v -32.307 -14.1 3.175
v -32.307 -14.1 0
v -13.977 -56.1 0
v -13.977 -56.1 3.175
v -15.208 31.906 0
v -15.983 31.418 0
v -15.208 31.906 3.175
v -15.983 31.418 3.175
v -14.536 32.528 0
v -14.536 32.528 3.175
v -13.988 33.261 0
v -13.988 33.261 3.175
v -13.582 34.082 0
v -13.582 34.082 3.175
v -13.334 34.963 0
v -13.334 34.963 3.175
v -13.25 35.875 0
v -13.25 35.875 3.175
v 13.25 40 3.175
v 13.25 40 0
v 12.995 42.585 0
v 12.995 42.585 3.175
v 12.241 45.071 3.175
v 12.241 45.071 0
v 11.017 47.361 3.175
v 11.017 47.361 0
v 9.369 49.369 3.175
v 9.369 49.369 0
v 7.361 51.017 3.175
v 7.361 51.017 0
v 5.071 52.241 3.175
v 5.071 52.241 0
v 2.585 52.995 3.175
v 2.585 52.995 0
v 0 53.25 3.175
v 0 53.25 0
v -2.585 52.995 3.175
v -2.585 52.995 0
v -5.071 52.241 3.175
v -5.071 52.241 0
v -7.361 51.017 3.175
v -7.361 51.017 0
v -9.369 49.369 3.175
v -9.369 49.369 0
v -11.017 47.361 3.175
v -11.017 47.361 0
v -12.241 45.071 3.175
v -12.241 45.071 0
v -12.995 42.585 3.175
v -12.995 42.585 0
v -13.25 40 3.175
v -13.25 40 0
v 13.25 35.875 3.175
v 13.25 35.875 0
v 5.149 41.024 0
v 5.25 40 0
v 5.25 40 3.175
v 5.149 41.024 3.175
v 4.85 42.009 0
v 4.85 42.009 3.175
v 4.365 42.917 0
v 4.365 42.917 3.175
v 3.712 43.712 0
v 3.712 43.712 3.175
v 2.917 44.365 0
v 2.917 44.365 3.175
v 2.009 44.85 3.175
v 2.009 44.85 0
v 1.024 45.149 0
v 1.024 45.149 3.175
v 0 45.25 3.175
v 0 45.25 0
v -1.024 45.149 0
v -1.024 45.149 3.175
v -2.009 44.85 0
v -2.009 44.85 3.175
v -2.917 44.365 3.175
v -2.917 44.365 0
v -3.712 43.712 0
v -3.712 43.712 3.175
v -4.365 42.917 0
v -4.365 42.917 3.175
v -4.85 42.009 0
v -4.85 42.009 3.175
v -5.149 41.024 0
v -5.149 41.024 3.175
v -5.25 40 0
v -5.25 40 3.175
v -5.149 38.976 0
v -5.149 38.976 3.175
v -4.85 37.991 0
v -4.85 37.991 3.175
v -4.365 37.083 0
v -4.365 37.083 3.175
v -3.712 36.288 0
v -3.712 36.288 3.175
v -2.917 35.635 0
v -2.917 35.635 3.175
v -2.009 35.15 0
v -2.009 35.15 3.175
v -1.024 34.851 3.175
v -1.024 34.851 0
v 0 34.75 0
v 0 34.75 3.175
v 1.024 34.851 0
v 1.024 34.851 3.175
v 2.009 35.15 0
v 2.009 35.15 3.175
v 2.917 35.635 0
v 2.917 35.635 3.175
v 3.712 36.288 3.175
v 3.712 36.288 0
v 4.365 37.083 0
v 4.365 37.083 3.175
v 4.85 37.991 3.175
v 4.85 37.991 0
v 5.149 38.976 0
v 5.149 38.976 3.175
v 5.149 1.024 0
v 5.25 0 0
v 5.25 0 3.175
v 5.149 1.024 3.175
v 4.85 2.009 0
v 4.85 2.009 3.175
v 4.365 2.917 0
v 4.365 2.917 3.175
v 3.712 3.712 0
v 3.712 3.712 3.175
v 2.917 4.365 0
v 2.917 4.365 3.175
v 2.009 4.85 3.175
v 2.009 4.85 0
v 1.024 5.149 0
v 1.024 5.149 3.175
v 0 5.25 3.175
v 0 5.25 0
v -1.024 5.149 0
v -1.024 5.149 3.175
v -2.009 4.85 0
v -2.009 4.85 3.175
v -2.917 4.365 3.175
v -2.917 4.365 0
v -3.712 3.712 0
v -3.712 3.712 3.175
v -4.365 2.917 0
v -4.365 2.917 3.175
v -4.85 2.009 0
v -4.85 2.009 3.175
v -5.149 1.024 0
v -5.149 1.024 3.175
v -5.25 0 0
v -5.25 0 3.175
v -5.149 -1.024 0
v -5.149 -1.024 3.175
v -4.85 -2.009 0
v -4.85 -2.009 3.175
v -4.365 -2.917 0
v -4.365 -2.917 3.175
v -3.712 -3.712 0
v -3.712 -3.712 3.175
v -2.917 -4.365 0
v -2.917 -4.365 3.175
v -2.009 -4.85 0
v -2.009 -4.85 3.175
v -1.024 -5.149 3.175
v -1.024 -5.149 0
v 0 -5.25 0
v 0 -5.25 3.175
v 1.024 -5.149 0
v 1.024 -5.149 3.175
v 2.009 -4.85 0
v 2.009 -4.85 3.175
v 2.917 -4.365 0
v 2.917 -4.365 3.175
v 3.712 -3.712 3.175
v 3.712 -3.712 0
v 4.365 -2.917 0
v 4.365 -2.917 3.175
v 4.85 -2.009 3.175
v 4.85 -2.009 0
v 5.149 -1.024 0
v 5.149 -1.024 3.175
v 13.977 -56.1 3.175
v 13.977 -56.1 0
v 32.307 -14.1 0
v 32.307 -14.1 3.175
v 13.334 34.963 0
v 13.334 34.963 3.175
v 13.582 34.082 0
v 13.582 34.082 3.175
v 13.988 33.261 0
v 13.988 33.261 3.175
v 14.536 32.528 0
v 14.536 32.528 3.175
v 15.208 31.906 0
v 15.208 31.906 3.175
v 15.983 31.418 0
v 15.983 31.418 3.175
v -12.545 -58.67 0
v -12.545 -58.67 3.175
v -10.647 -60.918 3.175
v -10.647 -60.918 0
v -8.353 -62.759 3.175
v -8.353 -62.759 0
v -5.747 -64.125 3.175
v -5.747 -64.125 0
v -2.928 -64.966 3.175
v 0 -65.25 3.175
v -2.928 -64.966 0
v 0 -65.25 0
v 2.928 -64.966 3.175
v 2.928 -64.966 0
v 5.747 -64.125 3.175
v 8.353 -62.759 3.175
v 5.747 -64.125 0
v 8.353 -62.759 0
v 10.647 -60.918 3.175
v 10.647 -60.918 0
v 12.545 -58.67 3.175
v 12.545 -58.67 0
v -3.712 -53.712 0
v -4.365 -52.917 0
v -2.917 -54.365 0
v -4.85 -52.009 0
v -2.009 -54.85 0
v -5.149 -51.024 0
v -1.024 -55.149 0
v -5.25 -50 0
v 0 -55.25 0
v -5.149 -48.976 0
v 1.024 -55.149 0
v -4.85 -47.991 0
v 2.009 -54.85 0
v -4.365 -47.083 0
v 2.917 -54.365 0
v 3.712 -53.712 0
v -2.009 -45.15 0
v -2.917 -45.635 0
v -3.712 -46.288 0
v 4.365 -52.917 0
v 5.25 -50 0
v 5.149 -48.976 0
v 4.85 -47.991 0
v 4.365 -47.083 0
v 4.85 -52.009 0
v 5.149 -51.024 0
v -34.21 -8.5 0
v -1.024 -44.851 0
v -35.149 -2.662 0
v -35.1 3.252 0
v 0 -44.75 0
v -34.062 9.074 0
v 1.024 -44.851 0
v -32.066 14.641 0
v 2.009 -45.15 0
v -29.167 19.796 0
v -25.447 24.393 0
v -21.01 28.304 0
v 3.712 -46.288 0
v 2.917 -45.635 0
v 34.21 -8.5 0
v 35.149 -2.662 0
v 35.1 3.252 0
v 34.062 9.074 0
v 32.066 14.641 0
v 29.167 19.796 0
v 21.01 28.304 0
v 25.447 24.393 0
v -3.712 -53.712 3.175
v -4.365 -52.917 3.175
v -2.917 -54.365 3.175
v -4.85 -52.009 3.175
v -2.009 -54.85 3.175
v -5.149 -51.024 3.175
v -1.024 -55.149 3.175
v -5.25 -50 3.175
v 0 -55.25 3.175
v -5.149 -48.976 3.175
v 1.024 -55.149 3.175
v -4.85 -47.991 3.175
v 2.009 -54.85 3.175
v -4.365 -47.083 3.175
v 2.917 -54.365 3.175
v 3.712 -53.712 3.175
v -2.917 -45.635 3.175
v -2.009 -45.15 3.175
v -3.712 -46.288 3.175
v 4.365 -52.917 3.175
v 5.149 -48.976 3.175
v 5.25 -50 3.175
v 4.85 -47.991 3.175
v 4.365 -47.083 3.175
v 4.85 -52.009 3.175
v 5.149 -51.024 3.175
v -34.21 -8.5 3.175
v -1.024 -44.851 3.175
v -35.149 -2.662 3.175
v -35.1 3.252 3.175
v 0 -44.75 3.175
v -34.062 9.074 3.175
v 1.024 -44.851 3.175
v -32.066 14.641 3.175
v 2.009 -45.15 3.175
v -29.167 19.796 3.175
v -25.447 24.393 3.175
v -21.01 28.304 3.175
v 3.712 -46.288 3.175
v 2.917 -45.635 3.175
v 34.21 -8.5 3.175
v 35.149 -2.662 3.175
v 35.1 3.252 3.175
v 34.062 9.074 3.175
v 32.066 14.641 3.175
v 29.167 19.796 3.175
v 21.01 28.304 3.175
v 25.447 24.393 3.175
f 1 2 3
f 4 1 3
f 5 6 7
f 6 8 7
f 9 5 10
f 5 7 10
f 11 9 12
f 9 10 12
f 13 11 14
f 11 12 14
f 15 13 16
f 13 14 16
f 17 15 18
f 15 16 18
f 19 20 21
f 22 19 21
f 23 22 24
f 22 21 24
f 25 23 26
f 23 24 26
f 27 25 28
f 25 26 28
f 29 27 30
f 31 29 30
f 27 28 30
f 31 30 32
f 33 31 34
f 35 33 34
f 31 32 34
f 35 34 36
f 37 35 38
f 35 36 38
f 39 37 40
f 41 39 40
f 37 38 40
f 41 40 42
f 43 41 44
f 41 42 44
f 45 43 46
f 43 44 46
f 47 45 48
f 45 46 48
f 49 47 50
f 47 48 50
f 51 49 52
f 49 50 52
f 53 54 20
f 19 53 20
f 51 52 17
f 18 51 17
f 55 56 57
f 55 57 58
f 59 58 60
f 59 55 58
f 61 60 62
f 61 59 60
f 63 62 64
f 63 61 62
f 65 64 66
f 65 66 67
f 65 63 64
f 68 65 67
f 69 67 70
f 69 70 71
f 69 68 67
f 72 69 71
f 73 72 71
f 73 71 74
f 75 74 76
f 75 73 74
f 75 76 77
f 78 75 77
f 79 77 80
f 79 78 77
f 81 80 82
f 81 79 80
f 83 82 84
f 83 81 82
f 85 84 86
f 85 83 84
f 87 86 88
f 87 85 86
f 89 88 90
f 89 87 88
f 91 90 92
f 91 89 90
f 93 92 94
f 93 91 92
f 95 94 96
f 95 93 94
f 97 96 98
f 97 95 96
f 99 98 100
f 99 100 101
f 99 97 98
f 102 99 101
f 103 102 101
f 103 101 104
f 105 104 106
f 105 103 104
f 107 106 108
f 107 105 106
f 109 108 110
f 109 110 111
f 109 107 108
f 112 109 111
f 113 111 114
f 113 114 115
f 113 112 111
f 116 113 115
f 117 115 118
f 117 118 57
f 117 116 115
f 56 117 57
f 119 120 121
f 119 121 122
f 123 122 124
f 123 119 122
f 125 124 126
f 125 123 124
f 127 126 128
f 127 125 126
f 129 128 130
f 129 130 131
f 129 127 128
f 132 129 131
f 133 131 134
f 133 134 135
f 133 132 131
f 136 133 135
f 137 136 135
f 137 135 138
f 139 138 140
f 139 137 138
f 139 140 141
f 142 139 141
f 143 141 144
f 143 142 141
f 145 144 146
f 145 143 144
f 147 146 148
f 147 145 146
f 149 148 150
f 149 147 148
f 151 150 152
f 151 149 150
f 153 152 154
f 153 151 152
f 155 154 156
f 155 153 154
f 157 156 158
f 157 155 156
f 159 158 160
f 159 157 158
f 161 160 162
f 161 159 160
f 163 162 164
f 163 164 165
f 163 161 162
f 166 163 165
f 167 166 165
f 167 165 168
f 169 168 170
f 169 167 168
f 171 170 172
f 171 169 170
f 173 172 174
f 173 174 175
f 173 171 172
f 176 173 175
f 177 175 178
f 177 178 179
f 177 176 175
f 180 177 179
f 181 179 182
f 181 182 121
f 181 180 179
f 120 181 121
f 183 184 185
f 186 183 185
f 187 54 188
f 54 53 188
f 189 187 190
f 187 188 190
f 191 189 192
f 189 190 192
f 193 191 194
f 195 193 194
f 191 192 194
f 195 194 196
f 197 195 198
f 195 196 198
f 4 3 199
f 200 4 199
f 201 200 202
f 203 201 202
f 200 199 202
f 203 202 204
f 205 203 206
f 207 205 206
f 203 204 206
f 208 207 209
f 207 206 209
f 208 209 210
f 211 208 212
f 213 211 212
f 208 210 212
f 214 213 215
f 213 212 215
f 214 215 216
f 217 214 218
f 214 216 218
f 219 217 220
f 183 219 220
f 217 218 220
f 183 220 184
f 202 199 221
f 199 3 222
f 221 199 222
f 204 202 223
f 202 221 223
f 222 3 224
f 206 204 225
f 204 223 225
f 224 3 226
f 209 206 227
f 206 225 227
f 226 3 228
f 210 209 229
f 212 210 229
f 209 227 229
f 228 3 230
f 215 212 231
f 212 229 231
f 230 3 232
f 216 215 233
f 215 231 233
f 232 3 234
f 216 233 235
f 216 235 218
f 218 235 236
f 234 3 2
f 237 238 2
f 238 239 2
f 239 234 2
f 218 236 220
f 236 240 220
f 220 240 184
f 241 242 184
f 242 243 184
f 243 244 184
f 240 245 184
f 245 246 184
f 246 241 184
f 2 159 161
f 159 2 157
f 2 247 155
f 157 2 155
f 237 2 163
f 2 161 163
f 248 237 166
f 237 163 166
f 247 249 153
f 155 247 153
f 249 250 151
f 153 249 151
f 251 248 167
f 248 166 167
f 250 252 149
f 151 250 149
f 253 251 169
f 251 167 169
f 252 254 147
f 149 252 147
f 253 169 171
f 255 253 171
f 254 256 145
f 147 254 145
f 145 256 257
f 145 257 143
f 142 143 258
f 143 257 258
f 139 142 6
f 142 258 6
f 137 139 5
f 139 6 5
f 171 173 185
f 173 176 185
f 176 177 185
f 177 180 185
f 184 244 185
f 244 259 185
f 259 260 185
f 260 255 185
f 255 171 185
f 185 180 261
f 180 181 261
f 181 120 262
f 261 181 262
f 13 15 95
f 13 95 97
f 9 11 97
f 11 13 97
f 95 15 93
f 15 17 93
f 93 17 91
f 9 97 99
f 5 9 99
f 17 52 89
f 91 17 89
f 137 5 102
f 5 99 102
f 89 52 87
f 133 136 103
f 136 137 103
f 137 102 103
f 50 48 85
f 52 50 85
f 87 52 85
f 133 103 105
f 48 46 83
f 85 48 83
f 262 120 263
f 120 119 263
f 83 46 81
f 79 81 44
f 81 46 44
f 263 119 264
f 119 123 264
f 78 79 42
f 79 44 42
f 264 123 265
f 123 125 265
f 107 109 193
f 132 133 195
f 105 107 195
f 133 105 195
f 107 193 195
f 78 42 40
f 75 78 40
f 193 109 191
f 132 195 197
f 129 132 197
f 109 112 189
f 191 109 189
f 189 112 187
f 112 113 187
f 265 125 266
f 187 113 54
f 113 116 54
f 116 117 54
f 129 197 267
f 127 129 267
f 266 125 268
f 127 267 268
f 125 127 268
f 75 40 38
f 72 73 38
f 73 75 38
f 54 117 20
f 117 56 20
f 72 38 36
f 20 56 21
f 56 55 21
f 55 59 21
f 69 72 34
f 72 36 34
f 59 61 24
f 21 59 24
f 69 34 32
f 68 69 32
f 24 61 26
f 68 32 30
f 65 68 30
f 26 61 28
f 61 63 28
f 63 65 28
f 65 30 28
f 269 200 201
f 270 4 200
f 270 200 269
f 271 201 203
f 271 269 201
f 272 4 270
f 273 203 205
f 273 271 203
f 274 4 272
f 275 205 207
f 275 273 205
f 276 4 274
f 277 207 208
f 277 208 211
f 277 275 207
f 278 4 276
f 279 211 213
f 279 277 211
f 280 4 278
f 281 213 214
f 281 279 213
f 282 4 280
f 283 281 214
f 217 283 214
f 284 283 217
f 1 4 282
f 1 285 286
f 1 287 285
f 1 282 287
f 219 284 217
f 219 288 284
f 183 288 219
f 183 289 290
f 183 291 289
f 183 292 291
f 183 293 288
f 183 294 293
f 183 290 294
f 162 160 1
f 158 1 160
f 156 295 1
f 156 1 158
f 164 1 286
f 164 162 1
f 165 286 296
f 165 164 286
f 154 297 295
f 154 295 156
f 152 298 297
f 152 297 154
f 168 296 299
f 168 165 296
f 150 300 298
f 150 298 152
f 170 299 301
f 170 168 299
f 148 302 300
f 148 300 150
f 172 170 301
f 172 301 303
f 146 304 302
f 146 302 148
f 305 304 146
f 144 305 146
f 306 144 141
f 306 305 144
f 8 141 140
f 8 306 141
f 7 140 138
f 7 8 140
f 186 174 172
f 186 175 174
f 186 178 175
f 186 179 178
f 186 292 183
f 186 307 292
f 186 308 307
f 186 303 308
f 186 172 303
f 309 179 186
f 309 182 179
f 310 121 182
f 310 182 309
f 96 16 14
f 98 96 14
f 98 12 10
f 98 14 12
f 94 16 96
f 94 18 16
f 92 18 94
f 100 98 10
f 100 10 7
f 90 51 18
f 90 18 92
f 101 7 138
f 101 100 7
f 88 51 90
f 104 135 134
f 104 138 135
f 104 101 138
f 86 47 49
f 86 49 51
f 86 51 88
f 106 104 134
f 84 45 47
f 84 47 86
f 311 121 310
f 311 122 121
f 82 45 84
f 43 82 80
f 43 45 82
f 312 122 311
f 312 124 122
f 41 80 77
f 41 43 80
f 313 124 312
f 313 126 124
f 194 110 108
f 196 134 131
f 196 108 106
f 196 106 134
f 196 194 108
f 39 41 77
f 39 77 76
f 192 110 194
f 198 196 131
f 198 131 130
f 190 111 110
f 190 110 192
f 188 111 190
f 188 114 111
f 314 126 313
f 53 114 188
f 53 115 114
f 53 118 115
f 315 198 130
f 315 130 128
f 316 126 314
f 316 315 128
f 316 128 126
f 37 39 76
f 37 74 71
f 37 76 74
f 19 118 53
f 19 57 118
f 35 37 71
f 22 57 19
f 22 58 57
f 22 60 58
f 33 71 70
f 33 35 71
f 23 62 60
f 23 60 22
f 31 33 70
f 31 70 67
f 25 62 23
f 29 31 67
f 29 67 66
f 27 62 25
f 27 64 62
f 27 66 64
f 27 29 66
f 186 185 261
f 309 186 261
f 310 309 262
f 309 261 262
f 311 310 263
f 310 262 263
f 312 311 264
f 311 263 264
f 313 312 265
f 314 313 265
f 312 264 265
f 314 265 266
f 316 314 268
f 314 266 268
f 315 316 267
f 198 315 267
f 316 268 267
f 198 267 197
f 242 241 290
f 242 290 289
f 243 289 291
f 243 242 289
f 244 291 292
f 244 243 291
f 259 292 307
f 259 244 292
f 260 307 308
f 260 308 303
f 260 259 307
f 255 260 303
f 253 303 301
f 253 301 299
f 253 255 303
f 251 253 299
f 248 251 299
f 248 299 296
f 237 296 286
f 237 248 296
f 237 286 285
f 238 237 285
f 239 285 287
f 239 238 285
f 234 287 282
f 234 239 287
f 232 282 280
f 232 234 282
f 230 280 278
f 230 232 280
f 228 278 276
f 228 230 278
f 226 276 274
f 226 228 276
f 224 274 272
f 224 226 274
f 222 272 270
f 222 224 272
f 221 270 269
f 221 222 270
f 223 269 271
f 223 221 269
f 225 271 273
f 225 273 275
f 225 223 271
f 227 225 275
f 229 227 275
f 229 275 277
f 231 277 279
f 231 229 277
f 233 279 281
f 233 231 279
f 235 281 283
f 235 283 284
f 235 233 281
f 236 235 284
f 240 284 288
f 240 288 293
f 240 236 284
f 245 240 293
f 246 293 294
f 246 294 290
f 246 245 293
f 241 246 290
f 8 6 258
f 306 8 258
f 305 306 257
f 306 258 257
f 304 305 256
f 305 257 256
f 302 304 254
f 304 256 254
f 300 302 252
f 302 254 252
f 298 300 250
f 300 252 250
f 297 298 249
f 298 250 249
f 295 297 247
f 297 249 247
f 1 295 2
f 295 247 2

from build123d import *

# Parameters (mm, degrees)
ESBO_O1_R       = 5.25
EXTRUS_O1_DEPTH = 3.175
FILETE1_R       = 5


with BuildPart() as part:
    # Esboço1 → Extrusão1 (new body)
    with BuildSketch(Plane.XY):
        with BuildLine():
            ThreePointArc((-13.25, 32.664965942), (-32.643593337, 13.30256795), (-32.307158649, -14.1))
            Line((-32.307158649, -14.1), (-13.97685587, -56.1))
            ThreePointArc((-13.97685587, -56.1), (0, -65.25), (13.97685587, -56.1))
            Line((13.97685587, -56.1), (32.307158649, -14.1))
            ThreePointArc((32.307158649, -14.1), (32.643593337, 13.30256795), (13.25, 32.664965942))
            Line((13.25, 32.664965942), (13.25, 40))
            ThreePointArc((13.25, 40), (0, 53.25), (-13.25, 40))
            Line((-13.25, 40), (-13.25, 32.664965942))
        make_face()
        with Locations((0, 40)):
            Circle(ESBO_O1_R, mode=Mode.SUBTRACT)
        with Locations((0, -50)):
            Circle(ESBO_O1_R, mode=Mode.SUBTRACT)
        Circle(ESBO_O1_R, mode=Mode.SUBTRACT)
    extrude(amount=EXTRUS_O1_DEPTH)

    # Filete1
    filete1_edges = [part.edges().sort_by_distance(p)[0] for p in [
        (13.25, 32.664965942, 1.5875),
        (-13.25, 32.664965942, 1.5875),
    ]]
    fillet(filete1_edges, radius=FILETE1_R)


solid = part.part
